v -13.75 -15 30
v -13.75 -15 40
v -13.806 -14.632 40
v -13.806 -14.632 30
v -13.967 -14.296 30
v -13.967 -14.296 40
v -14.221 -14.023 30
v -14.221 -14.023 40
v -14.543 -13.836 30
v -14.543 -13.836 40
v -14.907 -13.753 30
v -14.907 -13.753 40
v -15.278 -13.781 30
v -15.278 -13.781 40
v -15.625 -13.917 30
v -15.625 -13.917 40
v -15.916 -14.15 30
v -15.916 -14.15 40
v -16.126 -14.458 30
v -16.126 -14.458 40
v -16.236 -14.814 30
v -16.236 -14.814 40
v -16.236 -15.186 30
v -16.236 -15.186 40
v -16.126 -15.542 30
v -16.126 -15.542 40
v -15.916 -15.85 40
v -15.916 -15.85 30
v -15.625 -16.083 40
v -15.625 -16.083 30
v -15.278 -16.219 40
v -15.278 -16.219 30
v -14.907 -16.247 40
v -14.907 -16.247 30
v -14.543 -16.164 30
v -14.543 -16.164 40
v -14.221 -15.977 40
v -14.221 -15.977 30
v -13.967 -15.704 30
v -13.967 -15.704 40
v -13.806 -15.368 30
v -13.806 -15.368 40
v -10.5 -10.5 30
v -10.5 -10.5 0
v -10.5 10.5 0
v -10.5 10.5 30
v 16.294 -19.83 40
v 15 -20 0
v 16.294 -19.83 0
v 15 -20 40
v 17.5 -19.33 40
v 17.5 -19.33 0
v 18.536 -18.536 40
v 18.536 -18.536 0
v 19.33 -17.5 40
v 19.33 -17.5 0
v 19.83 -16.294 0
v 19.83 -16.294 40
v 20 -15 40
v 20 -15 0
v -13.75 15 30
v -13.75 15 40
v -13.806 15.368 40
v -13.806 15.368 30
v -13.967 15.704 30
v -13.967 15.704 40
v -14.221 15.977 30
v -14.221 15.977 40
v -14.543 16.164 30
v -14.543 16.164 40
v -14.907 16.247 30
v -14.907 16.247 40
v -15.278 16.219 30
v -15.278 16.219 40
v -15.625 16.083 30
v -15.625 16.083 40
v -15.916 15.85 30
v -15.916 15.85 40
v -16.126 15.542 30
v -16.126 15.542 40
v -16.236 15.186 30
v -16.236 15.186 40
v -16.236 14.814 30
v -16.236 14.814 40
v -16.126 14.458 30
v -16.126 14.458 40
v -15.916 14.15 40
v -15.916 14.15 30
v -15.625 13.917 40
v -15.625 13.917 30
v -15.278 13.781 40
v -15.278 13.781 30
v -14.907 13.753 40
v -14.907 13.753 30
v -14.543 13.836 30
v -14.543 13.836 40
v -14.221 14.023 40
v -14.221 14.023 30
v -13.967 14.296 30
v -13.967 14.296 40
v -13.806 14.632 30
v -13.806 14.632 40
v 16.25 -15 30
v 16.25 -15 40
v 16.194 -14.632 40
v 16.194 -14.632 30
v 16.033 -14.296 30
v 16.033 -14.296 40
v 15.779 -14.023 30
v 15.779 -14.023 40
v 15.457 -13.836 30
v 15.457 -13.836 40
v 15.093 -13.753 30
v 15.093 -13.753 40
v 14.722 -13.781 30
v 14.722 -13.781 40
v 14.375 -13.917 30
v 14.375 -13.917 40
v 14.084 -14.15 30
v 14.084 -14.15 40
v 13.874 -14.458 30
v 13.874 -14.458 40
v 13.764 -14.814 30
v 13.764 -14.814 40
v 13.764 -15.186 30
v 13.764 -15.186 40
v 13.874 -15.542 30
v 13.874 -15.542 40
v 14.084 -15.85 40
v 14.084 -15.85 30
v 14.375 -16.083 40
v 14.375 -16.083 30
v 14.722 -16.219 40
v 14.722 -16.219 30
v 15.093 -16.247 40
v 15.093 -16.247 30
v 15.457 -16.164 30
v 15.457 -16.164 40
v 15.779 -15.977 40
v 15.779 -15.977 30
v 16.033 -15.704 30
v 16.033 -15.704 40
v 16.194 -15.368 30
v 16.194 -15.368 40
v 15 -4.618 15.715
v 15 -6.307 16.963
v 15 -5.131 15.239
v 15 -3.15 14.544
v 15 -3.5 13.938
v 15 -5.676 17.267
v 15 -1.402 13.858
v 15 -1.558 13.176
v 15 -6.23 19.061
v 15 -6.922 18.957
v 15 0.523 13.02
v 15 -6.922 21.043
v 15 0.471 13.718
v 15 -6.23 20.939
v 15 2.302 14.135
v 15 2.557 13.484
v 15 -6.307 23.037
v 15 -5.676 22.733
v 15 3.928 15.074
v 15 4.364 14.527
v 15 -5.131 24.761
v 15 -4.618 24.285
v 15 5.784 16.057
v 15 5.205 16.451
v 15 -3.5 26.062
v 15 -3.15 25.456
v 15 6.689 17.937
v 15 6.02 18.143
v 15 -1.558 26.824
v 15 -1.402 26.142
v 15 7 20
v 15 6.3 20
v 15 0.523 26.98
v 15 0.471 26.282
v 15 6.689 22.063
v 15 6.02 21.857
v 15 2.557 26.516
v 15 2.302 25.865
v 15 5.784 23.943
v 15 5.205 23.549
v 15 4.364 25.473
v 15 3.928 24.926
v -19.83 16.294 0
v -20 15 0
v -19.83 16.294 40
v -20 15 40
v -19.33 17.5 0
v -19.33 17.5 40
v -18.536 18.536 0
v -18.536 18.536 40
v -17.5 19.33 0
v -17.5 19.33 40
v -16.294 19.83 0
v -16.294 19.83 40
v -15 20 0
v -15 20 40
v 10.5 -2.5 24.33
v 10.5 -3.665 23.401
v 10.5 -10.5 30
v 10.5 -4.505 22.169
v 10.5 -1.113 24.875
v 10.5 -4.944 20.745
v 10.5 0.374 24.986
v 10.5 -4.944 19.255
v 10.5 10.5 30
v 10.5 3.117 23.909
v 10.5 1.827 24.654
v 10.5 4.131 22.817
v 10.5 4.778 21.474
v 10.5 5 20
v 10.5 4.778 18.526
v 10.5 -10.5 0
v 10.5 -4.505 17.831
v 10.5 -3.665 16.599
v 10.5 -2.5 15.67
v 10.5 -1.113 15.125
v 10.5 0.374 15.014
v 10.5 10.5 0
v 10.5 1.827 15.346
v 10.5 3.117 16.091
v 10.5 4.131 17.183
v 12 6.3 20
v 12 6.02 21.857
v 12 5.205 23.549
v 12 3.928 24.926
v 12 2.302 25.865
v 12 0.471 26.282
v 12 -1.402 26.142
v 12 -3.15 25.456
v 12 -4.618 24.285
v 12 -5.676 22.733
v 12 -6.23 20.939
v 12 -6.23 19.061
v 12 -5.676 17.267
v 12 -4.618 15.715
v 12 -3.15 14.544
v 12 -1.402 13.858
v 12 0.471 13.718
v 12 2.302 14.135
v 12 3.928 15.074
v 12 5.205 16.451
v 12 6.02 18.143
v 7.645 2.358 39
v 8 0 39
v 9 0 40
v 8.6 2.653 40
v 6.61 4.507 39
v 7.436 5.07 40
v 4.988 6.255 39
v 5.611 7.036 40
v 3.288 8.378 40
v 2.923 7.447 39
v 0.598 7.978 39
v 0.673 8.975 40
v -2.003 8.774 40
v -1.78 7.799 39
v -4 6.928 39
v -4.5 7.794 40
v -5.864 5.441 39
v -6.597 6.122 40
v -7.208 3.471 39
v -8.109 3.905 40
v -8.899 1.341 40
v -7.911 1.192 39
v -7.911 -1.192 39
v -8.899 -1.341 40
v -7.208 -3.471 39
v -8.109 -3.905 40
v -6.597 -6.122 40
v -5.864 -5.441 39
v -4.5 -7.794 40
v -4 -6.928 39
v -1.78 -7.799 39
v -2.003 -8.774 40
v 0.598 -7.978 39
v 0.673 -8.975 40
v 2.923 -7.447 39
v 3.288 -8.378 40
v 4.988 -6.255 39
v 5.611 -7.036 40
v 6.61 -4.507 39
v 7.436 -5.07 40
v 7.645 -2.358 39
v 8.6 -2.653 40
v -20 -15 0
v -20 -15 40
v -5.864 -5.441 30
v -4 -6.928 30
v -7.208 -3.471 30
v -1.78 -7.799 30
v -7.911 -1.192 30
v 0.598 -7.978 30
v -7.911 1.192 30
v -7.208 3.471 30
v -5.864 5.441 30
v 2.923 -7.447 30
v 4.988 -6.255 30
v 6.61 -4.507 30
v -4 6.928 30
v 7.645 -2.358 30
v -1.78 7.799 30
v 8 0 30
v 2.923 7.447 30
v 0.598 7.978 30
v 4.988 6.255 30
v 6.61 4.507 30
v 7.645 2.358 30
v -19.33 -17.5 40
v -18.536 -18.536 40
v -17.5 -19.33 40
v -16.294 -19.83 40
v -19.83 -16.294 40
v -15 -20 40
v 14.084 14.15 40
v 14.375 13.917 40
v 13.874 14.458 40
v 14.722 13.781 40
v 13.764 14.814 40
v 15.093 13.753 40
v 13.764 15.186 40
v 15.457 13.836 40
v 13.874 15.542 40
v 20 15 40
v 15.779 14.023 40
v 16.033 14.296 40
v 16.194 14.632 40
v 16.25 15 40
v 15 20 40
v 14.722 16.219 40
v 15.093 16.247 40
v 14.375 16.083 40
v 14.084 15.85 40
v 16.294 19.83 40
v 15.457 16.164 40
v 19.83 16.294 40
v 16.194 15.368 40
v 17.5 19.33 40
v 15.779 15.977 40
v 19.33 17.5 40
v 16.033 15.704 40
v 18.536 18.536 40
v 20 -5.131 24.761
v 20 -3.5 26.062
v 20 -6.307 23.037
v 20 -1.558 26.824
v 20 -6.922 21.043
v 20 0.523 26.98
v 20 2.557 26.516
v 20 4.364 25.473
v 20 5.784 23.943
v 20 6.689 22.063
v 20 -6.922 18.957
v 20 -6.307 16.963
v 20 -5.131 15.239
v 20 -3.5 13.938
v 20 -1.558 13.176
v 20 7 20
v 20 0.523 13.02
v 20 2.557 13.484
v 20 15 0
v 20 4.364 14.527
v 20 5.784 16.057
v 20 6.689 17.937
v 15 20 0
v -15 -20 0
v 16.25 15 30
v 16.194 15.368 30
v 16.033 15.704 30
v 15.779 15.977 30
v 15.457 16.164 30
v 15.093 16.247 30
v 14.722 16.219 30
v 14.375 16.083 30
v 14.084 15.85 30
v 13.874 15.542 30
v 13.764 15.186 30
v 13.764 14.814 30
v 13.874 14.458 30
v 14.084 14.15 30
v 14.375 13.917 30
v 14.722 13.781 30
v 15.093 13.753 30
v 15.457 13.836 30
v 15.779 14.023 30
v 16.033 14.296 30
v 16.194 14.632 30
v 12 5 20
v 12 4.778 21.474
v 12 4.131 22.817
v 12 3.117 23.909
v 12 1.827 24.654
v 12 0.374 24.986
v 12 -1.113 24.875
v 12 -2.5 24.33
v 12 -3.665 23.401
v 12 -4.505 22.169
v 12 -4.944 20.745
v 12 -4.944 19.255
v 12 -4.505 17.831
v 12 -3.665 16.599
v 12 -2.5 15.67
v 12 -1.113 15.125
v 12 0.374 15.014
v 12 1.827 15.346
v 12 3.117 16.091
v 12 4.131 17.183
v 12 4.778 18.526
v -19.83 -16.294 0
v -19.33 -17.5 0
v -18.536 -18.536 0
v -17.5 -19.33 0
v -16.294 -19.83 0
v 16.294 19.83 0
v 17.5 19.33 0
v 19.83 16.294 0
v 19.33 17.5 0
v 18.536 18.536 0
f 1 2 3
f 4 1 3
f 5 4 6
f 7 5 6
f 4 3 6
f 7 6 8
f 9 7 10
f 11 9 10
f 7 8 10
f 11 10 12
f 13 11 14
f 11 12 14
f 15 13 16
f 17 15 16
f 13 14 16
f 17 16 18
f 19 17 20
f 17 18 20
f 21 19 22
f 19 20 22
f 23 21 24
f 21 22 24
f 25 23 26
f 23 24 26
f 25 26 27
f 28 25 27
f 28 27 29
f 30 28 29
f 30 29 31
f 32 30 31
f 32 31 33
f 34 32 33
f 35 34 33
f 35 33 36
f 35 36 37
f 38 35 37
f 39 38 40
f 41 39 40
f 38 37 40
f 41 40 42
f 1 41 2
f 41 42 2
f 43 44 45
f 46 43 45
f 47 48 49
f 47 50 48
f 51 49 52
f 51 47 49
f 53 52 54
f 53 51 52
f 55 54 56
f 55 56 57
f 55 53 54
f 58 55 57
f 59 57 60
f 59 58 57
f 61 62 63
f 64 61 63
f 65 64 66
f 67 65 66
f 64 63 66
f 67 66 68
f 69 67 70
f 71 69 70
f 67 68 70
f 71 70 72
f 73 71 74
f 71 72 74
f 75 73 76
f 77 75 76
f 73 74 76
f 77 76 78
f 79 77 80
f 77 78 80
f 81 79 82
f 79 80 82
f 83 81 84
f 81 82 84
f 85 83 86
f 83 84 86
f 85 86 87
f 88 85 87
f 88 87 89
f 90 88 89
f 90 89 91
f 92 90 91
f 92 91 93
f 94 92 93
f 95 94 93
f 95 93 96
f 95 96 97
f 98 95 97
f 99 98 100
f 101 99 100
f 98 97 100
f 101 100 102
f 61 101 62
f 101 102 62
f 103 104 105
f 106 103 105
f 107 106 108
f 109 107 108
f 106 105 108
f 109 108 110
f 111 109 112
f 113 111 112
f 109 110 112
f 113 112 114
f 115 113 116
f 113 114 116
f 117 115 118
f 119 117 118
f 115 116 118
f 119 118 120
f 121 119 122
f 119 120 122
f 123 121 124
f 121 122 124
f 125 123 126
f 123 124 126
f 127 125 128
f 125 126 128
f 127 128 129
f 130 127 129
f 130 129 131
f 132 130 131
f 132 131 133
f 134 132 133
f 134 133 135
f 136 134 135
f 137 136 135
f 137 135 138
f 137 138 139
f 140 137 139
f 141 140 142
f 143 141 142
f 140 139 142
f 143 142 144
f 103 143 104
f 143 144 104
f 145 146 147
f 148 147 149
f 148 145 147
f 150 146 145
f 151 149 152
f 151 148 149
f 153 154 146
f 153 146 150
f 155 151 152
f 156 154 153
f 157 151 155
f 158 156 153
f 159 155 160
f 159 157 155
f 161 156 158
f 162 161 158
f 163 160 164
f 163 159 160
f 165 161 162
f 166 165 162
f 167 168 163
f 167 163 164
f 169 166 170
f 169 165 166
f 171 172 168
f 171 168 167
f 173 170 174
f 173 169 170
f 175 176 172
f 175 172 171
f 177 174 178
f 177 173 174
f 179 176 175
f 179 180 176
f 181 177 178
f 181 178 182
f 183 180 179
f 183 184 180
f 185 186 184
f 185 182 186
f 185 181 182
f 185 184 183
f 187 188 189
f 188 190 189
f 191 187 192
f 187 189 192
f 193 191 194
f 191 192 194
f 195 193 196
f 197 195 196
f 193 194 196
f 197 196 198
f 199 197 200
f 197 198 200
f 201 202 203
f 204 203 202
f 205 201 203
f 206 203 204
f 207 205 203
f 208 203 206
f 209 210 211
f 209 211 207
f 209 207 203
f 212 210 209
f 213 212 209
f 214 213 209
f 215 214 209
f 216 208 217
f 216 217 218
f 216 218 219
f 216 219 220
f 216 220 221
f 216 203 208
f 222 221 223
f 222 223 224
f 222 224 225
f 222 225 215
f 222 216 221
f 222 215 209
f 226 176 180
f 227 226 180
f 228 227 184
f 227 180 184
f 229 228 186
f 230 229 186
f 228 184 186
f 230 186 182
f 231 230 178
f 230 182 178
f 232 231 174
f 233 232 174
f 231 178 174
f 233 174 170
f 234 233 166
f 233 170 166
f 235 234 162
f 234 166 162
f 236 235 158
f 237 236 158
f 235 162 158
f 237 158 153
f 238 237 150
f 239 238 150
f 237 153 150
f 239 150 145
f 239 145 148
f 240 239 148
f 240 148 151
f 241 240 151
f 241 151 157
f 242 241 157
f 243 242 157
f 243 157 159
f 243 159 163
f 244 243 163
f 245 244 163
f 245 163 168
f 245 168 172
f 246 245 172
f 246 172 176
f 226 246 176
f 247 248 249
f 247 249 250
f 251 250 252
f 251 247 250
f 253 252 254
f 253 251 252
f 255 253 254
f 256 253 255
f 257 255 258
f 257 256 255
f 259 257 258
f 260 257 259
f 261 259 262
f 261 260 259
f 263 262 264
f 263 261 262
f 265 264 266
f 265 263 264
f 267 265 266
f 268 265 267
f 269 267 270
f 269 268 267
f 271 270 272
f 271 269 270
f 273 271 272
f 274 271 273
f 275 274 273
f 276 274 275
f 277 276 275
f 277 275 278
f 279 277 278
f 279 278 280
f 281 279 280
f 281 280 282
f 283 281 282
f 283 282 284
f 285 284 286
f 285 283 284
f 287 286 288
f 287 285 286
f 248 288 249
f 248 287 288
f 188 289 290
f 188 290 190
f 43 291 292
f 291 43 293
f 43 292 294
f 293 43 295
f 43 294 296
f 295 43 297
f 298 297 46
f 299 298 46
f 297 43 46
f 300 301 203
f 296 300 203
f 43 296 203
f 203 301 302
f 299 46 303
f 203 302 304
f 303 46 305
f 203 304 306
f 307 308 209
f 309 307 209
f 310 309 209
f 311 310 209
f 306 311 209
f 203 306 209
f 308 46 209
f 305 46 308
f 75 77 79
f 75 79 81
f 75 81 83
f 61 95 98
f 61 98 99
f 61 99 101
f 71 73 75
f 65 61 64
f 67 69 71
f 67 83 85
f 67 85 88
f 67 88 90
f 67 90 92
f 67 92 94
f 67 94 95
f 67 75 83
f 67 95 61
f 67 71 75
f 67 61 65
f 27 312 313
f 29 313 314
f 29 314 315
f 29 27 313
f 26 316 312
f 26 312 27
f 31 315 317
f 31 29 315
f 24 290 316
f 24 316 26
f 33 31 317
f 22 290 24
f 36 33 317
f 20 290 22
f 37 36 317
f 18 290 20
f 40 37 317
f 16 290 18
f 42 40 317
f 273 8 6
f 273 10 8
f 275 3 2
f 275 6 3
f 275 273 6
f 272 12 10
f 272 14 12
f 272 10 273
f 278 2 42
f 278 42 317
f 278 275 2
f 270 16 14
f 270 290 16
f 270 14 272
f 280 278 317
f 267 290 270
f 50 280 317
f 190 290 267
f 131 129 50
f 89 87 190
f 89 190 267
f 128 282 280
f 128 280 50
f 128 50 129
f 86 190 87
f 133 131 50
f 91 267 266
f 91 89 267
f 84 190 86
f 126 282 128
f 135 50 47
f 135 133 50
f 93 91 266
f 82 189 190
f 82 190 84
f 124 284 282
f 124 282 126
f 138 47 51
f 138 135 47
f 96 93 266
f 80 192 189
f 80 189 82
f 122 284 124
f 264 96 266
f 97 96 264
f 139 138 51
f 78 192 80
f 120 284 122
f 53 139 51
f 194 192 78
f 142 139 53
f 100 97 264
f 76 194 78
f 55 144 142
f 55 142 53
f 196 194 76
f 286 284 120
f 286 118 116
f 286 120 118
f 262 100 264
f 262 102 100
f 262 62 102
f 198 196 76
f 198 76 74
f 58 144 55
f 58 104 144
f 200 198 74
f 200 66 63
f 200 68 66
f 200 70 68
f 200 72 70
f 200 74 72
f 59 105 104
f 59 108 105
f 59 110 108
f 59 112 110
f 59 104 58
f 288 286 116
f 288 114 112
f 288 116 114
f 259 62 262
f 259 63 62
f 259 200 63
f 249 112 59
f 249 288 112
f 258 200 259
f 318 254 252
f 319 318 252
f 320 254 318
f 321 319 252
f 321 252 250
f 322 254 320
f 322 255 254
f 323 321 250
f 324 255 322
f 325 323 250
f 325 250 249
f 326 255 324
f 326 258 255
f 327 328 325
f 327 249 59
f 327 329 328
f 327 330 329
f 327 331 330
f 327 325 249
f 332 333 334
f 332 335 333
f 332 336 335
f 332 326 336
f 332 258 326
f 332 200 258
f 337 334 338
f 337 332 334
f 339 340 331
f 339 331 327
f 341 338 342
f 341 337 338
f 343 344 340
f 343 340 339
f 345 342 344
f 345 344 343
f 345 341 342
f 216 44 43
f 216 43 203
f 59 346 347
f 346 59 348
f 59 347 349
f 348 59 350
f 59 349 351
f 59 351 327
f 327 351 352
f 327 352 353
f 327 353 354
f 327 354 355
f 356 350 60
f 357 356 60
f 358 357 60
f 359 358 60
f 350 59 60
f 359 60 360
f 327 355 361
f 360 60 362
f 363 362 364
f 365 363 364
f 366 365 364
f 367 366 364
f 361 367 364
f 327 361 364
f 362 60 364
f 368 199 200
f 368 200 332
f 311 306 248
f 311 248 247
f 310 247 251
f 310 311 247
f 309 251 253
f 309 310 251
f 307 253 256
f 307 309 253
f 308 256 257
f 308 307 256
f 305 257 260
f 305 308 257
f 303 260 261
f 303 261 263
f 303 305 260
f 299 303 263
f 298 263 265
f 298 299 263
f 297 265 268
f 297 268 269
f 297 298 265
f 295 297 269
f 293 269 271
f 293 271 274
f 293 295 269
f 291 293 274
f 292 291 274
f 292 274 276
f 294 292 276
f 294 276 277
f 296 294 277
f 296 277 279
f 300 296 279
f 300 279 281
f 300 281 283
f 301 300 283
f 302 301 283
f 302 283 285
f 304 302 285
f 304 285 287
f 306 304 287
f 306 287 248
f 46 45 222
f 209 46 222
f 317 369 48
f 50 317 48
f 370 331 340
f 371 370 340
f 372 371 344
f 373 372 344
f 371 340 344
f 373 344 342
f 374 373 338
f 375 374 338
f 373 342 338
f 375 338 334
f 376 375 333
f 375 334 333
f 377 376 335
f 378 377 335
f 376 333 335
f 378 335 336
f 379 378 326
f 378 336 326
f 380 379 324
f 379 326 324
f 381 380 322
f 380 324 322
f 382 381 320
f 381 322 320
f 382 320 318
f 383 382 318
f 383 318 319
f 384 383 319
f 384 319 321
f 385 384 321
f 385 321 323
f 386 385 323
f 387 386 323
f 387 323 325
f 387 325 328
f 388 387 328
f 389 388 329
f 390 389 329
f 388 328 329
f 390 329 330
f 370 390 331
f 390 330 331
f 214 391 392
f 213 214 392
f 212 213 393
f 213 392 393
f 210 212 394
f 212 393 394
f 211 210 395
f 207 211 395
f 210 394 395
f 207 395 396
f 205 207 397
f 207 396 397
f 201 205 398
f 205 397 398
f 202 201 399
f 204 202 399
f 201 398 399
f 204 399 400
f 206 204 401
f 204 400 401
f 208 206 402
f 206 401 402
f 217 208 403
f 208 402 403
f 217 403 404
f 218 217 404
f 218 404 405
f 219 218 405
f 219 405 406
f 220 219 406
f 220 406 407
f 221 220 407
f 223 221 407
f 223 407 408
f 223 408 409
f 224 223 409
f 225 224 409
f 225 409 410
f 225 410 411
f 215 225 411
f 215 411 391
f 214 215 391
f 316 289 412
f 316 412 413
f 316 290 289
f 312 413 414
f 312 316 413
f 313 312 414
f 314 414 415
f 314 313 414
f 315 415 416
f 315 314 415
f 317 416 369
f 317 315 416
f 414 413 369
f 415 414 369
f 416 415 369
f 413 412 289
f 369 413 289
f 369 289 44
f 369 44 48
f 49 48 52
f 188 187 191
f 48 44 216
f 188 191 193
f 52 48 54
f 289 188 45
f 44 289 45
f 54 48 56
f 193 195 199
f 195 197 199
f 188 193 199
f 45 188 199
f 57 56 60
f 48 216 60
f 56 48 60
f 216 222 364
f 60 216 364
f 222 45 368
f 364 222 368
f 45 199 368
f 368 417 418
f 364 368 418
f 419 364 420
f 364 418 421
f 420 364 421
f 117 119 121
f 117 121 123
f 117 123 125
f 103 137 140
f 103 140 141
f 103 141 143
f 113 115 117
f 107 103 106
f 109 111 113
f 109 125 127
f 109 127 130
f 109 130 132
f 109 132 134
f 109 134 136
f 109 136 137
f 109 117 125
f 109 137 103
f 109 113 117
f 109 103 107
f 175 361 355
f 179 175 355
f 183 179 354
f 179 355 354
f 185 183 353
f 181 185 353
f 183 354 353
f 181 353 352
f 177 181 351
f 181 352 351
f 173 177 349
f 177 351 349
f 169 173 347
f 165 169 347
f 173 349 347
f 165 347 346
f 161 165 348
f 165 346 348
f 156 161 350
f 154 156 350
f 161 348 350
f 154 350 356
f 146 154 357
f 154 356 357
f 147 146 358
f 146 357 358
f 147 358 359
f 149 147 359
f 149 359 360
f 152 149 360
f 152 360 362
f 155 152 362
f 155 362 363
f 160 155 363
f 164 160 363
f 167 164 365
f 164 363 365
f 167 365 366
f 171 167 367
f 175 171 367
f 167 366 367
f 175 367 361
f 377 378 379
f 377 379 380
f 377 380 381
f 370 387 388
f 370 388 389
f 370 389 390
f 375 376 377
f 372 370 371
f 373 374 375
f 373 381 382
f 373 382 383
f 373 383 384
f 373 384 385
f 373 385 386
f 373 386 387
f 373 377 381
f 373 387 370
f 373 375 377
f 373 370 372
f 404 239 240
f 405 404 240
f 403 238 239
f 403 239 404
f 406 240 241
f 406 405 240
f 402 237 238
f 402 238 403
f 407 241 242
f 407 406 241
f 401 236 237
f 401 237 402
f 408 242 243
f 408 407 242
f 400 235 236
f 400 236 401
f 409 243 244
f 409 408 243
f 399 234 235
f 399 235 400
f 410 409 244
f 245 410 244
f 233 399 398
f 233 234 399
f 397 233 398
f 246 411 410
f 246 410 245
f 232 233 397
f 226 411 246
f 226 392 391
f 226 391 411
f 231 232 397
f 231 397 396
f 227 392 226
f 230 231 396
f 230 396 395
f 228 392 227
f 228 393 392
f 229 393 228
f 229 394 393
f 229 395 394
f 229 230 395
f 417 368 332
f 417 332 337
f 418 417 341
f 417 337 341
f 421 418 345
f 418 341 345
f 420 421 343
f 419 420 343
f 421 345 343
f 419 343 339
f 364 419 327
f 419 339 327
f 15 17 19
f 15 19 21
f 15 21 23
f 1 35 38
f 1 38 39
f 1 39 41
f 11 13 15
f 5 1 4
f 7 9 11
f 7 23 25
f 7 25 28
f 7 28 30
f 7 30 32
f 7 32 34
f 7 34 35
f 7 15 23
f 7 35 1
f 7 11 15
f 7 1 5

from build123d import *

# Parameters (mm, degrees)
F0_W      = 40
F0_H      = 40
F0_R      = 8
F1_DEPTH  = 40
F2_W      = 21
F2_H      = 21
F3_DEPTH  = 30
F5_R      = 5
F6_DEPTH  = 11
F7_R      = 6.3
F8_DEPTH  = 8
F9_R      = 7
F10_DEPTH = 5
F11_R     = 5
F12_SIZE  = 1
F13_R     = 1.25
F14_DEPTH = 10


with BuildPart() as f1:
    # F0 (on Top) → F1 (new body)
    with BuildSketch(Plane.XY):
        Rectangle(F0_W, F0_H)
        Circle(F0_R, mode=Mode.SUBTRACT)
    extrude(amount=F1_DEPTH)


with BuildPart() as f3:
    # F2 (on Top) → F3 (new body)
    with BuildSketch(Plane.XY):
        Rectangle(F2_W, F2_H)
    extrude(amount=F3_DEPTH)


with BuildPart() as f1_1:
    add(f1.part)

    # F4: cut F3
    add(f3.part, mode=Mode.SUBTRACT)

    # F5 (on face) → F6 (cut)
    with BuildSketch(Plane.YZ.offset(20)):
        with Locations((0, 20)):
            Circle(F5_R)
    extrude(amount=-F6_DEPTH, mode=Mode.SUBTRACT)

    # F7 (on face) → F8 (cut)
    with BuildSketch(Plane.YZ.offset(20)):
        with Locations((0, 20)):
            Circle(F7_R)
    extrude(amount=-F8_DEPTH, mode=Mode.SUBTRACT)

    # F9 (on face) → F10 (cut)
    with BuildSketch(Plane.YZ.offset(20)):
        with Locations((0, 20)):
            Circle(F9_R)
    extrude(amount=-F10_DEPTH, mode=Mode.SUBTRACT)

    # F11
    f11_edges = [f1_1.edges().sort_by_distance(p)[0] for p in [
        (20, 20, 20),
        (-20, 20, 20),
        (-20, -20, 20),
        (20, -20, 20),
    ]]
    fillet(f11_edges, radius=F11_R)

    # F12
    f12_edges = [f1_1.edges().sort_by_distance(p)[0] for p in [
        (-8, 0, 40),
    ]]
    chamfer(f12_edges, length=F12_SIZE)

    # F13 (on face) → F14 (cut)
    with BuildSketch(Plane.XY.offset(40)):
        with Locations((-15, 15)):
            Circle(F13_R)
        with Locations((-15, -15)):
            Circle(F13_R)
        with Locations((15, -15)):
            Circle(F13_R)
        with Locations((15, 15)):
            Circle(F13_R)
    extrude(amount=-F14_DEPTH, mode=Mode.SUBTRACT)


solid = f1_1.part
